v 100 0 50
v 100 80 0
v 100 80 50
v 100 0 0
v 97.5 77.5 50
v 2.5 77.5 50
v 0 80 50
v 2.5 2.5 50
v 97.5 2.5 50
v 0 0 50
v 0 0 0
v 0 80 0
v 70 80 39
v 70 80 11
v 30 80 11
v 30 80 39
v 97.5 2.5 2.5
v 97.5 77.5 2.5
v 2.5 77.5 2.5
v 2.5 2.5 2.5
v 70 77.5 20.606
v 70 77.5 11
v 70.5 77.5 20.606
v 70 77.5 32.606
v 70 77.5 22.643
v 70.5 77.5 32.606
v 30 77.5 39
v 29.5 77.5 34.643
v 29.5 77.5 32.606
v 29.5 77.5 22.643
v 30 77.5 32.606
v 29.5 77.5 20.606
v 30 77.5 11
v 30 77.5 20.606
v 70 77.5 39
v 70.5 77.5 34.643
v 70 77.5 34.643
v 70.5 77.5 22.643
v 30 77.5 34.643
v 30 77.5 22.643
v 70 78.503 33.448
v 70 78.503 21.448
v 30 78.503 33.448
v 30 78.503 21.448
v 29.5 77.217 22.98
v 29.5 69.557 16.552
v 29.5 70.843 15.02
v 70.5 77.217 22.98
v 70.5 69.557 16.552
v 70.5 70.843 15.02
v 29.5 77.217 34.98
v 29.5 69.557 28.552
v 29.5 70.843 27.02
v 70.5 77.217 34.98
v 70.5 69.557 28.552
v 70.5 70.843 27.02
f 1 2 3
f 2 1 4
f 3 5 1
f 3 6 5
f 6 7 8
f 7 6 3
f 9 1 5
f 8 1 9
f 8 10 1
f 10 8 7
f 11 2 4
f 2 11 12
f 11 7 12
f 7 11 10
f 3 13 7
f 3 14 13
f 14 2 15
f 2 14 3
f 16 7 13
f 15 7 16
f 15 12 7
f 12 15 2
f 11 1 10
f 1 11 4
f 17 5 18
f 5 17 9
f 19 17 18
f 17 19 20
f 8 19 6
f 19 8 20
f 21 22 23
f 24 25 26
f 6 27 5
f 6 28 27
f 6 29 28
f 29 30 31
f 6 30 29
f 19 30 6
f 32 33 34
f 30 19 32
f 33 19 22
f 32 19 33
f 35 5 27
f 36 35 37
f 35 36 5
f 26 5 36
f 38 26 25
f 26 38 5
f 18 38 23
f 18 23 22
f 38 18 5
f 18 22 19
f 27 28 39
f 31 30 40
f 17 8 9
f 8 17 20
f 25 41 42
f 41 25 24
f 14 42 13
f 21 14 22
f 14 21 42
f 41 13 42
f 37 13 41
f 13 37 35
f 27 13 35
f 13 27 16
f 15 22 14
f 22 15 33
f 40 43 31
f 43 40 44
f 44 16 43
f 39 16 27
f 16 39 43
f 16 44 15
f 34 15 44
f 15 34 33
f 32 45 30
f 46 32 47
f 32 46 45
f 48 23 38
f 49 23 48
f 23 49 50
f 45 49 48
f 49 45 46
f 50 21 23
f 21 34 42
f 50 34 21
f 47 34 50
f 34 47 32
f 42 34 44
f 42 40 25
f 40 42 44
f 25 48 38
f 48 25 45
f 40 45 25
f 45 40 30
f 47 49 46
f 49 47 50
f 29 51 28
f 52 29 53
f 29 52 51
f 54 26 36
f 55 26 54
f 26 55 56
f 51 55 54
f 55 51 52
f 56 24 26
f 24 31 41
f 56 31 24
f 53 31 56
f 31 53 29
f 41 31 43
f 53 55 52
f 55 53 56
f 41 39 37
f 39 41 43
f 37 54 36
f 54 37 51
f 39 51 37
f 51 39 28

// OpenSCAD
$fn = 32;

// ----------------------------------------------------------------------
// Vent box: louvers enclosure
// ----------------------------------------------------------------------

// --- parameters (mm) ---
box_l = 100;              // box length, X
box_w = 80;               // box width, Y
box_h = 50;               // box height, Z
wall_t = 2.5;             // shell wall thickness
win_l = 40;               // vent window width, X
win_h = 28;               // vent window height, Z
slat_t = 2;               // louver slat thickness
slat_d = 10;              // louver slat depth
slat_a = 40;              // louver slat angle, degrees
slat_pitch = 12;          // louver pitch
slat_yc = 74.03;          // slat centreline Y

win_z0 = (box_h - win_h) / 2;  // window lower edge Z
n_slats = 2;  // louver count
slat_z0 = win_z0 + (win_h - (n_slats - 1) * slat_pitch) / 2;

difference() {
  union() {
    difference() {
      cube([box_l, box_w, box_h]);
  translate([wall_t, wall_t, wall_t])
    cube([box_l - 2 * wall_t, box_w - 2 * wall_t, box_h]);
  translate([(box_l - win_l) / 2, box_w - wall_t - 1, win_z0])
    cube([win_l, wall_t + 2, win_h]);
    }
    for (i = [0 : n_slats - 1])
      translate([box_l / 2, slat_yc, slat_z0 + i * slat_pitch])
        rotate([slat_a, 0, 0])
          cube([win_l + 1, slat_d, slat_t], center = true);
  }
}
